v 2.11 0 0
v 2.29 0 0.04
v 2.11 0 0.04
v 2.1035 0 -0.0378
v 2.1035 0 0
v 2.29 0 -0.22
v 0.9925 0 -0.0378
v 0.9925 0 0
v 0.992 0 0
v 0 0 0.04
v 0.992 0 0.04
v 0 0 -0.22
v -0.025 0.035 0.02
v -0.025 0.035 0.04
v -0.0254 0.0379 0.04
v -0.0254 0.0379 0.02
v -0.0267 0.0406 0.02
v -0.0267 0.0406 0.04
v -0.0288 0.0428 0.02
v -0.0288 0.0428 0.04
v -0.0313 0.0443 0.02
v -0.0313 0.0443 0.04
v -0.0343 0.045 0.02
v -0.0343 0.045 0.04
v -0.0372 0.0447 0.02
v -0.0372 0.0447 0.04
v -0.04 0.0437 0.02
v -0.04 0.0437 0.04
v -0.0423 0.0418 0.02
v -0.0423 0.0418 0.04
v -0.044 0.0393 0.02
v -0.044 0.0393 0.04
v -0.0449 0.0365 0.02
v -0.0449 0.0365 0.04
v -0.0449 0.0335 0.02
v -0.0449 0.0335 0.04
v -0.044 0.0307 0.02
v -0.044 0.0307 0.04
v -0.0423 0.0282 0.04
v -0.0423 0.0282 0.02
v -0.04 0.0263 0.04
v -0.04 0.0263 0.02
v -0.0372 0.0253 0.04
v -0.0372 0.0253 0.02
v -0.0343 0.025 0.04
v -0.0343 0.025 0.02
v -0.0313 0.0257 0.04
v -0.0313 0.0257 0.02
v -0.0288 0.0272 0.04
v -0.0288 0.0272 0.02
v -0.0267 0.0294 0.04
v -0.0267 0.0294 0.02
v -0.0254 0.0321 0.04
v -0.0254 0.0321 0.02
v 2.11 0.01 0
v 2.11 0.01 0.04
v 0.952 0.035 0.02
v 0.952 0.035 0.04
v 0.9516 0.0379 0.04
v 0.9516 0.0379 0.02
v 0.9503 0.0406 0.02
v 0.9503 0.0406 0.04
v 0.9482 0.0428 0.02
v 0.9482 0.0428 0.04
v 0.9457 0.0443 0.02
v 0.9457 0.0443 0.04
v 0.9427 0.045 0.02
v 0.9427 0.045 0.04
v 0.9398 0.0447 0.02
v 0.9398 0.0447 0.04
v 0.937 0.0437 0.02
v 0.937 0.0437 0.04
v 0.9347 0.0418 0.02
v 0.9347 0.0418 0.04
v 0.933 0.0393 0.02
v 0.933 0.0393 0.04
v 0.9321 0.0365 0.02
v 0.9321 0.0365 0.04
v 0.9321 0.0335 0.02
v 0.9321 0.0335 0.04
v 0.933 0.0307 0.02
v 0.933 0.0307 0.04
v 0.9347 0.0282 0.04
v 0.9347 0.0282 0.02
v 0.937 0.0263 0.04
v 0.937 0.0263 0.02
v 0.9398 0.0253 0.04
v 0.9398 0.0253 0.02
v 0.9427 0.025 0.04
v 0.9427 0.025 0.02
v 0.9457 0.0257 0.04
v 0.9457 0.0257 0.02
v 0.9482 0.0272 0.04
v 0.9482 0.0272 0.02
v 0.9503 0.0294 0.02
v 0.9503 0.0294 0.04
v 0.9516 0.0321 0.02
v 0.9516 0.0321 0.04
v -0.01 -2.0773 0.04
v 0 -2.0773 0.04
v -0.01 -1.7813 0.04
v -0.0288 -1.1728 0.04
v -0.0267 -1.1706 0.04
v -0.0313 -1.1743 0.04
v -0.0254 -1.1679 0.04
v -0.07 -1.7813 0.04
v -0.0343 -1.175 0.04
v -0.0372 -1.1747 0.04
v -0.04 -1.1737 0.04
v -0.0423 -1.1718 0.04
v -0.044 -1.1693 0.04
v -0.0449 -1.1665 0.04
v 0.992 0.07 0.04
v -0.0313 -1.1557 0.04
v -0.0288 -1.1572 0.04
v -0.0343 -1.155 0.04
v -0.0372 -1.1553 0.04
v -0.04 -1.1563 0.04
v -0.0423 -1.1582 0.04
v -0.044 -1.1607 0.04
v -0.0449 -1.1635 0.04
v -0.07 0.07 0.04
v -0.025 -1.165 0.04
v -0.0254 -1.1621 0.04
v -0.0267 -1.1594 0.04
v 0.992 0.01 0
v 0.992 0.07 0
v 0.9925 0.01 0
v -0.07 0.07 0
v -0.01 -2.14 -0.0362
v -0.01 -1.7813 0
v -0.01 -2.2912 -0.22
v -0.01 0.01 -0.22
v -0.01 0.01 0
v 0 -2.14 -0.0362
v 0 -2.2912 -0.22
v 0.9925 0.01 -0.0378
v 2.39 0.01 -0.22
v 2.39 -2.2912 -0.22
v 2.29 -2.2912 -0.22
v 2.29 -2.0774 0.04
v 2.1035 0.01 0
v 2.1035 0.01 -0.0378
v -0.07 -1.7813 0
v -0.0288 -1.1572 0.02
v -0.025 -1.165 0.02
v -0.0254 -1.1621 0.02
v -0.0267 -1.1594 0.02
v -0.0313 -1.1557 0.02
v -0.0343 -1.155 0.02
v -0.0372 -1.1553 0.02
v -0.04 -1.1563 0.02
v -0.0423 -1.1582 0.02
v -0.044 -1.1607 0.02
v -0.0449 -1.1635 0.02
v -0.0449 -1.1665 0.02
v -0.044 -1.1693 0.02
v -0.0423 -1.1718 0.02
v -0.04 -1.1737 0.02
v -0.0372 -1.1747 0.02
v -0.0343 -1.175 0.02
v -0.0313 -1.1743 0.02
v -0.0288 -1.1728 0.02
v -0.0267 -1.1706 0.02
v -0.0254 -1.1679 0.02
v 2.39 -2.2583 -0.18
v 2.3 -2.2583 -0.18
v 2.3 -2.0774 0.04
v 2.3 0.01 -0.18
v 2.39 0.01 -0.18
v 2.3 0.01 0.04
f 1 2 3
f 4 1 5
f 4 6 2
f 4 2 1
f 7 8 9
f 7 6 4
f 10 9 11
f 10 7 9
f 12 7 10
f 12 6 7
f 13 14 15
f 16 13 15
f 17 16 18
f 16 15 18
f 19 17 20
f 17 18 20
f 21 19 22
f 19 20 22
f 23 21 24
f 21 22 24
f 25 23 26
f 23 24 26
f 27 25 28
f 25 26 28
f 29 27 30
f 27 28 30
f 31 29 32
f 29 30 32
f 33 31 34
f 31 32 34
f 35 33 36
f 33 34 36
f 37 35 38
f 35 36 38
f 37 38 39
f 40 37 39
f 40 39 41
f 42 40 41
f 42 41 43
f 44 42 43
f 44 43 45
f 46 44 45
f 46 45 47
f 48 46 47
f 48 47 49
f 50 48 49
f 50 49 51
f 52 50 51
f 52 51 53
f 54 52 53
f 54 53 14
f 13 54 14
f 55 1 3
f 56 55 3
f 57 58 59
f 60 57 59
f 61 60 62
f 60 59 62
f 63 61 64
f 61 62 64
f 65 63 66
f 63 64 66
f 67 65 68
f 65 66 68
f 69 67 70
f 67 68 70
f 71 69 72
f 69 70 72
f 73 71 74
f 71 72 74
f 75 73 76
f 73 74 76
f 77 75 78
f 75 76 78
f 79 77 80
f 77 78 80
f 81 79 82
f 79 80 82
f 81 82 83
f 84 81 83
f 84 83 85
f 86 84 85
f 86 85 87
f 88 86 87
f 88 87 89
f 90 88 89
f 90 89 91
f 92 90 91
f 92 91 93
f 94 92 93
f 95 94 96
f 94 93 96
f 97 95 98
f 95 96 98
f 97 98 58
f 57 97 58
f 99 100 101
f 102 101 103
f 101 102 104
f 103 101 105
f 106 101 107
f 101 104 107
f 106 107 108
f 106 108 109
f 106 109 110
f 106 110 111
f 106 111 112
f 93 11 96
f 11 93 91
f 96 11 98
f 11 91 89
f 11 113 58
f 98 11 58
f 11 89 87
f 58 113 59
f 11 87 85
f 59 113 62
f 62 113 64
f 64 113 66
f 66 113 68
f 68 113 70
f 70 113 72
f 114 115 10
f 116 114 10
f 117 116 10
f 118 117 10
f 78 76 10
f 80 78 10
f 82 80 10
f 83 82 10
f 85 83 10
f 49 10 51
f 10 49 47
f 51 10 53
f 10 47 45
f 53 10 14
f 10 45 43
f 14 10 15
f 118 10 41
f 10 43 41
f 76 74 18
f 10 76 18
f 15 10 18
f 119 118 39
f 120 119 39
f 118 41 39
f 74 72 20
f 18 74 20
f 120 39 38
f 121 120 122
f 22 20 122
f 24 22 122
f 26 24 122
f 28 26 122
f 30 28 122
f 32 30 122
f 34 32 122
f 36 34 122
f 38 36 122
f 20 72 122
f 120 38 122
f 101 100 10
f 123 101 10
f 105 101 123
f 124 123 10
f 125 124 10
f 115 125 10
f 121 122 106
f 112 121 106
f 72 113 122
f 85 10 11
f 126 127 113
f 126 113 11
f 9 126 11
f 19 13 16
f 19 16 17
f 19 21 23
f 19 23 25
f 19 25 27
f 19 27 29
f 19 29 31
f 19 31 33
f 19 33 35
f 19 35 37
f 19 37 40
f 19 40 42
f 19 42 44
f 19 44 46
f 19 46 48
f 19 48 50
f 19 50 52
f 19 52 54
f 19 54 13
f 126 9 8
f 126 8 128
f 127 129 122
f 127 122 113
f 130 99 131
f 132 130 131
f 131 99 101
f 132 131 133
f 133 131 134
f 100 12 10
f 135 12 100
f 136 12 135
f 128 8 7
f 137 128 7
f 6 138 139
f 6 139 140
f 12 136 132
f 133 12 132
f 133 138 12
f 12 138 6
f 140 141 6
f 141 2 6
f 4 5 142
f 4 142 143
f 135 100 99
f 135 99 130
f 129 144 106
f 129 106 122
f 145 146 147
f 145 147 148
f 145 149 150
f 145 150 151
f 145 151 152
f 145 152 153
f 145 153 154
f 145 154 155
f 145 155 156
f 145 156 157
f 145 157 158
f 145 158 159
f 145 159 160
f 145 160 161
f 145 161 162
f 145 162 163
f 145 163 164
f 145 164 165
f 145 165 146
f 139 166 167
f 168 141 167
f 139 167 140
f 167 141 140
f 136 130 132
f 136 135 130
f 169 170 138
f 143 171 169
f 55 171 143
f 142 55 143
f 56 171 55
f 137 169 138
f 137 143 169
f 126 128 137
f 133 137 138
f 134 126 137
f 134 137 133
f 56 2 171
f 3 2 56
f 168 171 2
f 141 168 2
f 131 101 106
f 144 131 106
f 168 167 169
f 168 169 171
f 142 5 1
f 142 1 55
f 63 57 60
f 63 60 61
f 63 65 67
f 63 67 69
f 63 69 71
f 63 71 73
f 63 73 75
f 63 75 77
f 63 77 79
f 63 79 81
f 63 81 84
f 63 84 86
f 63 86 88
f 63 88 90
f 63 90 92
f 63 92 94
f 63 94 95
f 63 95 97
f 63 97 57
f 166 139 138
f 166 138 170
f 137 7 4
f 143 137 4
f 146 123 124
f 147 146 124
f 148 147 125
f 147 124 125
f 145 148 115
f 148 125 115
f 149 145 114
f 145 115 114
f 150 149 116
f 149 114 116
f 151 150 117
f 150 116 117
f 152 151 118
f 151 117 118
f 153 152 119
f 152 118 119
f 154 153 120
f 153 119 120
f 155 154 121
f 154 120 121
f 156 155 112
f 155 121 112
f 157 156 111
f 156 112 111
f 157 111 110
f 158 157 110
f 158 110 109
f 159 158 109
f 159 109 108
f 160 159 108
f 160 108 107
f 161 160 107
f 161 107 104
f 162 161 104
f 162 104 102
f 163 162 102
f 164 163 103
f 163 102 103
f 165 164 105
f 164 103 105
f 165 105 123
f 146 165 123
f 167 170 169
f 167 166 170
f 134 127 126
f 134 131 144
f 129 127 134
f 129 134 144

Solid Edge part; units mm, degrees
sketch "Sketch1" plane through (0, 0, 0) normal (0, 0, 1) x (1, 0, 0)
  line L0 (0.992, 0) -> (0, 0)
  line L1 (0, 0) -> (0, -2.14)
  line L2 (0, -2.14) -> (-0.07, -2.14)
  line L3 (-0.07, -2.14) -> (-0.07, 0.07)
  line L4 (-0.07, 0.07) -> (0.992, 0.07)
  line L5 (0.992, 0.07) -> (0.992, 0)
  dimension "D1" = 0.992
  dimension "D2" = 2.14
  dimension "D3" = 0.07
extrude "Protrusion1" add sketch "Sketch1" along normal blind 0.04
sketch "Sketch2" plane through (0.465, -0.965, 0) normal (0, 0, -1) x (1, 0, 0)
  line L0 (-0.465, -0.965) -> (-0.465, 1.175)
  line L1 (-0.465, 1.175) -> (-0.475, 1.175)
  line L2 (-0.475, 1.175) -> (-0.475, -0.975)
  line L3 (0.527, -0.975) -> (-0.475, -0.975)
  line L4 (0.527, -0.975) -> (0.527, -0.965)
  line L5 (0.527, -0.965) -> (-0.465, -0.965)
  dimension "D1" = 0.01
extrude "Ausprägung_2" add sketch "Sketch2" along normal blind 0.22
sketch "Sketch3" plane through (0.992, 0.035, -0.1) normal (1, 0, 0) x (0, 1, 0)
  line L0 (-0.025, -0.12) -> (-0.025, 0.1)
  line L1 (-0.035, 0.1) -> (-0.025, 0.1)
  line L2 (-0.035, -0.12) -> (-0.035, 0.1)
  line L3 (-0.035, -0.12) -> (-0.025, -0.12)
extrude "Ausprägung_3" add sketch "Sketch3" along normal blind 1.465
sketch "Sketch4" plane through (1.245, 0, -0.09) normal (0, -1, 0) x (1, 0, 0)
  line L0 (-0.2525, 0.0522) -> (0.8585, 0.0522)
  line L1 (0.8585, 0.09) -> (0.8585, 0.0522)
  line L2 (0.8585, 0.09) -> (-0.2525, 0.09)
  line L3 (-0.2525, 0.09) -> (-0.2525, 0.0522)
extrude "Cutout1" cut sketch "Sketch4" against normal through all
sketch "Sketch5" plane through (0.465, -0.965, 0.04) normal (0, 0, 1) x (1, 0, 0)
  circle A0 centre (0.477, 1) radius 0.01
  circle A1 centre (-0.5, -0.2) radius 0.01
  circle A2 centre (-0.5, 1) radius 0.01
  dimension "D1" = 0.02
  dimension "D2" = 0.05
  dimension "D3" = 1.2
extrude "Ausschnitt_1" cut sketch "Sketch5" against normal blind 0.02
sketch "Sketch6" plane through (0, -1.07, -0.09) normal (1, 0, 0) x (0, 1, 0)
  line L0 (-1.07, -0.13) -> (-1.2212, -0.13)
  line L1 (-1.07, 0.0538) -> (-1.2212, -0.13)
  line L2 (-1.07, 0.0538) -> (-1.07, -0.13)
extrude "Ausprägung_4" add sketch "Sketch6" against normal blind 0.01
sketch "Sketch7" plane through (0, -1.1456, -0.09) normal (1, 0, 0) x (0, 1, 0)
  line L0 (-0.9317, 0.13) -> (-0.9944, 0.0538)
  line L1 (-0.9944, 0.13) -> (-0.9944, 0.0538)
  line L2 (-0.9317, 0.13) -> (-0.9944, 0.13)
extrude "Cutout2" cut sketch "Sketch7" against normal through all
sketch "Sketch8" plane through (0.565, -1.0037, 0.04) normal (0, 0, 1) x (0, 1, 0)
  line L0 (-0.7776, 0.575) -> (-1.1066, 0.575)
  line L1 (-1.1066, 0.635) -> (-1.1066, 0.575)
  line L2 (-1.1066, 0.635) -> (-0.7776, 0.635)
  line L3 (-0.7776, 0.575) -> (-0.7776, 0.635)
extrude "Cutout3" cut sketch "Sketch8" against normal through all
sketch "Sketch9" plane through (1.28, 0, -0.09) normal (0, -1, 0) x (1, 0, 0)
  line L0 (1.19, 0.13) -> (1.19, 0.09)
  line L1 (1.19, 0.09) -> (0.83, 0.09)
  line L2 (0.83, 0.09) -> (0.83, 0.13)
  line L3 (1.19, 0.13) -> (0.83, 0.13)
extrude "Protrusion2" add sketch "Sketch9" against normal up to surface (0.01 mm away)
sketch "Sketch10" plane through (1.28, 0, -0.09) normal (0, -1, 0) x (1, 0, 0)
  line L0 (1.02, 0.13) -> (1.01, 0.13)
  line L1 (1.01, 0.13) -> (1.01, -0.13)
  line L2 (1.11, -0.13) -> (1.01, -0.13)
  line L3 (1.11, -0.13) -> (1.11, -0.09)
  line L4 (1.11, -0.09) -> (1.02, -0.09)
  line L5 (1.02, -0.09) -> (1.02, 0.13)
  dimension "D1" = 1.11
extrude "Ausprägung_7" add sketch "Sketch10" along normal blind 2.4
sketch "Sketch11" plane through (1.145, 0, -0.09) normal (0, -1, 0) x (1, 0, 0)
  line L0 (1.325, 0.13) -> (1.155, 0.13)
  line L1 (1.155, -0.09) -> (1.155, 0.13)
  line L2 (1.245, -0.09) -> (1.155, -0.09)
  line L3 (1.245, -0.09) -> (1.245, -0.13)
  line L4 (1.245, -0.13) -> (1.325, -0.13)
  line L5 (1.325, -0.13) -> (1.325, 0.13)
extrude "Cutout4" cut sketch "Sketch11" against normal through all
sketch "Sketch12" plane through (2.29, -1.2, -0.09) normal (-1, 0, 0) x (0, -1, 0)
  line L0 (0.8774, 0.13) -> (1.0912, -0.13)
  line L1 (1.2, -0.13) -> (1.0912, -0.13)
  line L2 (1.2, 0.13) -> (1.2, -0.13)
  line L3 (1.2, 0.13) -> (0.8774, 0.13)
extrude "Cutout5" cut sketch "Sketch12" against normal through all
